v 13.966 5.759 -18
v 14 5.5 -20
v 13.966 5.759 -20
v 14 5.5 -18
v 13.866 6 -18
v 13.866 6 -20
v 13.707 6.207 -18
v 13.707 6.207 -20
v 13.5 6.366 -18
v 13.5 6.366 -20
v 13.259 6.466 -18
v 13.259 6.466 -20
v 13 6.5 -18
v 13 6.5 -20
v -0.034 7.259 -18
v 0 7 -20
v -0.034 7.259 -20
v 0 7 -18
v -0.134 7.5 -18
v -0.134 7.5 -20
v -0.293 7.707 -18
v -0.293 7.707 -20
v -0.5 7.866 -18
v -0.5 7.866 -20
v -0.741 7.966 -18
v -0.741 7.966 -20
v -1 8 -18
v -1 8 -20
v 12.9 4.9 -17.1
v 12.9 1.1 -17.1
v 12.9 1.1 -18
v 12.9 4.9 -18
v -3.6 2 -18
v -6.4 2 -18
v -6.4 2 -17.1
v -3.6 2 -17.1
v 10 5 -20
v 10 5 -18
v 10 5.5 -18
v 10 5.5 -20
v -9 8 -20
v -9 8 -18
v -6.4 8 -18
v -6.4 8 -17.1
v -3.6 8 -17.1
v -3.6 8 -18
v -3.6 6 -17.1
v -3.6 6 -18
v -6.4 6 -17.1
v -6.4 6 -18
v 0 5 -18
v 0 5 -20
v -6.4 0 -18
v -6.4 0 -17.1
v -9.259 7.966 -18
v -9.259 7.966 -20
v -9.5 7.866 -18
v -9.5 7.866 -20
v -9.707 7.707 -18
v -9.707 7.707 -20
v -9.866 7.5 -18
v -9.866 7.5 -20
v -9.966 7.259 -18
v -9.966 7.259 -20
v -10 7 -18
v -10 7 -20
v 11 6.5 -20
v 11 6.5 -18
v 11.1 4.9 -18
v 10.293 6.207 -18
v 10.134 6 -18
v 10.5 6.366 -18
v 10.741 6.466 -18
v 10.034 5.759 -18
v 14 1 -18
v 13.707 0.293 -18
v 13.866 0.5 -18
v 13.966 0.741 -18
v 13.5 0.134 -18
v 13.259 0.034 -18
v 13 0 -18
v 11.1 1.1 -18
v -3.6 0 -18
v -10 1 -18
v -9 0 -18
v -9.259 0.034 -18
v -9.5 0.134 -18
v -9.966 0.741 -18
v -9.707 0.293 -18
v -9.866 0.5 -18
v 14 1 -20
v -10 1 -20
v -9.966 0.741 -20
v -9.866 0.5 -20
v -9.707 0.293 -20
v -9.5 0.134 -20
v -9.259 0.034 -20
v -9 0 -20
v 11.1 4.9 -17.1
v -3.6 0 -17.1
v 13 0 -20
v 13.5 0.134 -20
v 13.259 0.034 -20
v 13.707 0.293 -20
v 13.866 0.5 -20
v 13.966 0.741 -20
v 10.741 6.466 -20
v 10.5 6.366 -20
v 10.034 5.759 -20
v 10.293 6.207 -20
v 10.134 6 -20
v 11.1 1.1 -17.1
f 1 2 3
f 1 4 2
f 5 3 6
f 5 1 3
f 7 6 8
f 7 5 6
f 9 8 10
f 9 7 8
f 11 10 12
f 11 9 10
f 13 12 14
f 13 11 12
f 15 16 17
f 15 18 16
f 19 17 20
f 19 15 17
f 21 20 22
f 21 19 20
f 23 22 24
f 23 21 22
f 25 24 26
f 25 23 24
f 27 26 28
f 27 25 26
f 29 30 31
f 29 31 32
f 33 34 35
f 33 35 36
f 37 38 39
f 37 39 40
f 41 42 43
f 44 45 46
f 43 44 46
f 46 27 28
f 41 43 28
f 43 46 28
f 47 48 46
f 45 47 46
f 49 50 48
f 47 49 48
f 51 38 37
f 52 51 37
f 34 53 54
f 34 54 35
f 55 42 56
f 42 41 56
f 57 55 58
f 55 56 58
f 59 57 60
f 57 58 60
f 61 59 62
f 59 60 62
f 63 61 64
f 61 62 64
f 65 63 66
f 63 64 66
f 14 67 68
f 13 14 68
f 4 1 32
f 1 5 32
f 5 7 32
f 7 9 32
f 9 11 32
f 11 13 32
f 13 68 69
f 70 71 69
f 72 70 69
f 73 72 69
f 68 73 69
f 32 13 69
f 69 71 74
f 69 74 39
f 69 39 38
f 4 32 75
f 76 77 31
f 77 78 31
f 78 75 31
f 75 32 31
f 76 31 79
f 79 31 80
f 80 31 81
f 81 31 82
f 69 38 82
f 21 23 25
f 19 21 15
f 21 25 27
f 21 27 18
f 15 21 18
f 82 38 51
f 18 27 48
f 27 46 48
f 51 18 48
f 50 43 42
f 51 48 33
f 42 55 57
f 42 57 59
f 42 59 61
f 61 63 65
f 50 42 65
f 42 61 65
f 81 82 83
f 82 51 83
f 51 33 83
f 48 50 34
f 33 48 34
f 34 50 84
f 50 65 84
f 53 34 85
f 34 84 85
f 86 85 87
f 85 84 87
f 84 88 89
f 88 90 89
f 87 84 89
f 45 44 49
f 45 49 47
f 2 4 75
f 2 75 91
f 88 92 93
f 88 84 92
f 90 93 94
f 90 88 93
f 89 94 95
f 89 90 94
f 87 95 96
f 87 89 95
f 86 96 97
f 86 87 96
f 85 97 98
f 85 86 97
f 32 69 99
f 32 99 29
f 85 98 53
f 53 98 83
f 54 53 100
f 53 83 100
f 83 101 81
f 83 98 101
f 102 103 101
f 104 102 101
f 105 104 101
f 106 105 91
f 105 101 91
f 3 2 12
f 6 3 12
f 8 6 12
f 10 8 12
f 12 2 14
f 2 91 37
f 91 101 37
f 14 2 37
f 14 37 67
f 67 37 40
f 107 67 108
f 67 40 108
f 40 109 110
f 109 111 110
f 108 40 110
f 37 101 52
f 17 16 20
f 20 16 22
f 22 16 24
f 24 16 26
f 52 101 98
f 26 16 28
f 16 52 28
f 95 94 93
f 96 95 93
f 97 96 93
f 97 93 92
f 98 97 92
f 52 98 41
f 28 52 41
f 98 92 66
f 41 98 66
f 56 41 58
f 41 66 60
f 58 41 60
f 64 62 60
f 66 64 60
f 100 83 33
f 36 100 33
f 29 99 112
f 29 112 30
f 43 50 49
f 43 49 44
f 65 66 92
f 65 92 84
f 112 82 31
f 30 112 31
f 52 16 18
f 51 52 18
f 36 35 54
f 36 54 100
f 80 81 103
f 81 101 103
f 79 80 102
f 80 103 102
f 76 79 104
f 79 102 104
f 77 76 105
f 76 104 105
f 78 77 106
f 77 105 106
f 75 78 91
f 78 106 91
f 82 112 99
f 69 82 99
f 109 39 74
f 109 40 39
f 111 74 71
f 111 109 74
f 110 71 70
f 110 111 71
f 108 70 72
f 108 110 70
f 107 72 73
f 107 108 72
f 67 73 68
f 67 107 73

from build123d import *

# Parameters (mm, degrees)
SKETCH1_W           = 14
SKETCH1_H           = 22
SKETCH1_W_2         = 10
SKETCH1_H_2         = 18
EXTRUDE_THIN1_DEPTH = 2
SKETCH2_W           = 2
SKETCH2_H           = 22
BOSS_EXTRUDE1_DEPTH = 4.5
SKETCH3_W           = 22
SKETCH3_H           = 8
SKETCH3_W_2         = 18
SKETCH3_H_2         = 4
EXTRUDE_THIN2_DEPTH = 2
SKETCH4_W           = 20
SKETCH4_H           = 8
CUT_EXTRUDE1_DEPTH  = 26
SKETCH5_W           = 0.9
SKETCH5_H           = 1.9
SKETCH5_H_2         = 3.8
BOSS_EXTRUDE2_DEPTH = 0.9
SKETCH6_W           = 2
SKETCH6_H           = 1.9
BOSS_EXTRUDE3_DEPTH = 8
SKETCH7_W           = 2.8
SKETCH7_H           = 2
BOSS_EXTRUDE4_DEPTH = 0.9
SKETCH8_W           = 0.9
SKETCH8_H           = 0.9
CUT_EXTRUDE2_DEPTH  = 25.657656012
BOSS_EXTRUDE5_REACH = 26.658
SKETCH9_W           = 2
SKETCH9_H           = 3
BOSS_EXTRUDE6_DEPTH = 2
SKETCH11_W          = 1.1
SKETCH11_H          = 3.8
BOSS_EXTRUDE7_DEPTH = 0.9
SKETCH12_W          = 1.1
SKETCH12_H          = 3.8
CUT_EXTRUDE3_DEPTH  = 0.9
FILLET1_R           = 1


with BuildPart() as part:
    # Sketch1 → Extrude-Thin1 (new body)
    with BuildSketch(Plane(origin=(0, 0, 0), x_dir=(1, 0, 0), z_dir=(0, 1, 0))):
        with Locations((5, 9)):
            Rectangle(SKETCH1_W, SKETCH1_H)
        with Locations((5, 9)):
            Rectangle(SKETCH1_W_2, SKETCH1_H_2, mode=Mode.SUBTRACT)
    extrude(amount=EXTRUDE_THIN1_DEPTH)

    # Sketch2 → Boss-Extrude1 (add)
    with BuildSketch(Plane(origin=(0, 2, 0), x_dir=(1, 0, 0), z_dir=(0, 1, 0))):
        with Locations((11, 9)):
            Rectangle(SKETCH2_W, SKETCH2_H)
    extrude(amount=BOSS_EXTRUDE1_DEPTH)

    # Sketch3 → Extrude-Thin2 (add)
    with BuildSketch(Plane.ZY.offset(2)):
        with Locations((-9, 4)):
            Rectangle(SKETCH3_W, SKETCH3_H)
        with Locations((-9, 4)):
            Rectangle(SKETCH3_W_2, SKETCH3_H_2, mode=Mode.SUBTRACT)
    extrude(amount=-EXTRUDE_THIN2_DEPTH)

    # Sketch4 → Cut-Extrude1 (cut)
    with BuildSketch(Plane(origin=(12, 0, 0), x_dir=(0, 0, -1), z_dir=(1, 0, 0))):
        with Locations((8, 4)):
            Rectangle(SKETCH4_W, SKETCH4_H)
    extrude(amount=-CUT_EXTRUDE1_DEPTH, mode=Mode.SUBTRACT)

    # Sketch5 → Boss-Extrude2 (add)
    with BuildSketch(Plane.XY.offset(-18)):
        with Locations((-1.55, 7.05)):
            Rectangle(SKETCH5_W, SKETCH5_H)
        with Locations((-1.55, 0.95)):
            Rectangle(SKETCH5_W, SKETCH5_H)
        with Locations((11.55, 3)):
            Rectangle(SKETCH5_W, SKETCH5_H_2)
    extrude(amount=BOSS_EXTRUDE2_DEPTH)

    # Sketch6 → Boss-Extrude3 (add)
    with BuildSketch(Plane.ZY.offset(2)):
        Polygon((-18, 1.9), (-18, 6.1), (-18, 8), (-20, 8), (-20, 1.9), align=None)
        with Locations((-19, 0.95)):
            Rectangle(SKETCH6_W, SKETCH6_H)
    extrude(amount=BOSS_EXTRUDE3_DEPTH)

    # Sketch7 → Boss-Extrude4 (add)
    with BuildSketch(Plane.XY.offset(-18)):
        with Locations((-5, 7)):
            Rectangle(SKETCH7_W, SKETCH7_H)
        with Locations((-5, 1)):
            Rectangle(SKETCH7_W, SKETCH7_H)
    extrude(amount=BOSS_EXTRUDE4_DEPTH)

    # Sketch8 → Cut-Extrude2 (cut, through all)
    with BuildSketch(Plane(origin=(0, 8, 0), x_dir=(1, 0, 0), z_dir=(0, 1, 0))):
        with Locations((-1.55, 17.55)):
            Rectangle(SKETCH8_W, SKETCH8_H)
    extrude(amount=-CUT_EXTRUDE2_DEPTH, mode=Mode.SUBTRACT)

    # Sketch9 → Boss-Extrude5 (add, up to next)
    with BuildSketch(Plane(origin=(0, 0, 0), x_dir=(0, 0, -1), z_dir=(1, 0, 0)), mode=Mode.PRIVATE) as boss_extrude5_sk1:
        with Locations((19, 3.5)):
            Rectangle(SKETCH9_W, SKETCH9_H)
    boss_extrude5_tool1 = extrude(boss_extrude5_sk1.sketch, amount=BOSS_EXTRUDE5_REACH, mode=Mode.PRIVATE) - part.part
    add(boss_extrude5_tool1.solids().sort_by_distance((0, 3.5, -19))[0])

    # Sketch10 → Boss-Extrude6 (add)
    with BuildSketch(Plane(origin=(12, 0, 0), x_dir=(0, 0, -1), z_dir=(1, 0, 0))):
        Polygon((18, 6.5), (18, 4.9), (17.1, 4.9), (17.1, 1.1), (18, 1.1), (18, 0), (20, 0), (20, 6.5), align=None)
    extrude(amount=BOSS_EXTRUDE6_DEPTH)

    # Sketch11 → Boss-Extrude7 (add)
    with BuildSketch(Plane.XY.offset(-18)):
        with Locations((10.55, 3)):
            Rectangle(SKETCH11_W, SKETCH11_H)
    extrude(amount=BOSS_EXTRUDE7_DEPTH)

    # Sketch12 → Cut-Extrude3 (cut)
    with BuildSketch(Plane.XY.offset(-17.1)):
        with Locations((10.55, 3)):
            Rectangle(SKETCH12_W, SKETCH12_H)
        with Locations((13.45, 3)):
            Rectangle(SKETCH12_W, SKETCH12_H)
    extrude(amount=-CUT_EXTRUDE3_DEPTH, mode=Mode.SUBTRACT)

    # Fillet1
    fillet1_edges = [part.edges().sort_by_distance(p)[0] for p in [
        (-10, 0, -19),
        (-10, 8, -19),
        (14, 6.5, -19),
        (14, 0, -19),
        (10, 6.5, -19),
        (0, 8, -19),
    ]]
    fillet(fillet1_edges, radius=FILLET1_R)


solid = part.part
